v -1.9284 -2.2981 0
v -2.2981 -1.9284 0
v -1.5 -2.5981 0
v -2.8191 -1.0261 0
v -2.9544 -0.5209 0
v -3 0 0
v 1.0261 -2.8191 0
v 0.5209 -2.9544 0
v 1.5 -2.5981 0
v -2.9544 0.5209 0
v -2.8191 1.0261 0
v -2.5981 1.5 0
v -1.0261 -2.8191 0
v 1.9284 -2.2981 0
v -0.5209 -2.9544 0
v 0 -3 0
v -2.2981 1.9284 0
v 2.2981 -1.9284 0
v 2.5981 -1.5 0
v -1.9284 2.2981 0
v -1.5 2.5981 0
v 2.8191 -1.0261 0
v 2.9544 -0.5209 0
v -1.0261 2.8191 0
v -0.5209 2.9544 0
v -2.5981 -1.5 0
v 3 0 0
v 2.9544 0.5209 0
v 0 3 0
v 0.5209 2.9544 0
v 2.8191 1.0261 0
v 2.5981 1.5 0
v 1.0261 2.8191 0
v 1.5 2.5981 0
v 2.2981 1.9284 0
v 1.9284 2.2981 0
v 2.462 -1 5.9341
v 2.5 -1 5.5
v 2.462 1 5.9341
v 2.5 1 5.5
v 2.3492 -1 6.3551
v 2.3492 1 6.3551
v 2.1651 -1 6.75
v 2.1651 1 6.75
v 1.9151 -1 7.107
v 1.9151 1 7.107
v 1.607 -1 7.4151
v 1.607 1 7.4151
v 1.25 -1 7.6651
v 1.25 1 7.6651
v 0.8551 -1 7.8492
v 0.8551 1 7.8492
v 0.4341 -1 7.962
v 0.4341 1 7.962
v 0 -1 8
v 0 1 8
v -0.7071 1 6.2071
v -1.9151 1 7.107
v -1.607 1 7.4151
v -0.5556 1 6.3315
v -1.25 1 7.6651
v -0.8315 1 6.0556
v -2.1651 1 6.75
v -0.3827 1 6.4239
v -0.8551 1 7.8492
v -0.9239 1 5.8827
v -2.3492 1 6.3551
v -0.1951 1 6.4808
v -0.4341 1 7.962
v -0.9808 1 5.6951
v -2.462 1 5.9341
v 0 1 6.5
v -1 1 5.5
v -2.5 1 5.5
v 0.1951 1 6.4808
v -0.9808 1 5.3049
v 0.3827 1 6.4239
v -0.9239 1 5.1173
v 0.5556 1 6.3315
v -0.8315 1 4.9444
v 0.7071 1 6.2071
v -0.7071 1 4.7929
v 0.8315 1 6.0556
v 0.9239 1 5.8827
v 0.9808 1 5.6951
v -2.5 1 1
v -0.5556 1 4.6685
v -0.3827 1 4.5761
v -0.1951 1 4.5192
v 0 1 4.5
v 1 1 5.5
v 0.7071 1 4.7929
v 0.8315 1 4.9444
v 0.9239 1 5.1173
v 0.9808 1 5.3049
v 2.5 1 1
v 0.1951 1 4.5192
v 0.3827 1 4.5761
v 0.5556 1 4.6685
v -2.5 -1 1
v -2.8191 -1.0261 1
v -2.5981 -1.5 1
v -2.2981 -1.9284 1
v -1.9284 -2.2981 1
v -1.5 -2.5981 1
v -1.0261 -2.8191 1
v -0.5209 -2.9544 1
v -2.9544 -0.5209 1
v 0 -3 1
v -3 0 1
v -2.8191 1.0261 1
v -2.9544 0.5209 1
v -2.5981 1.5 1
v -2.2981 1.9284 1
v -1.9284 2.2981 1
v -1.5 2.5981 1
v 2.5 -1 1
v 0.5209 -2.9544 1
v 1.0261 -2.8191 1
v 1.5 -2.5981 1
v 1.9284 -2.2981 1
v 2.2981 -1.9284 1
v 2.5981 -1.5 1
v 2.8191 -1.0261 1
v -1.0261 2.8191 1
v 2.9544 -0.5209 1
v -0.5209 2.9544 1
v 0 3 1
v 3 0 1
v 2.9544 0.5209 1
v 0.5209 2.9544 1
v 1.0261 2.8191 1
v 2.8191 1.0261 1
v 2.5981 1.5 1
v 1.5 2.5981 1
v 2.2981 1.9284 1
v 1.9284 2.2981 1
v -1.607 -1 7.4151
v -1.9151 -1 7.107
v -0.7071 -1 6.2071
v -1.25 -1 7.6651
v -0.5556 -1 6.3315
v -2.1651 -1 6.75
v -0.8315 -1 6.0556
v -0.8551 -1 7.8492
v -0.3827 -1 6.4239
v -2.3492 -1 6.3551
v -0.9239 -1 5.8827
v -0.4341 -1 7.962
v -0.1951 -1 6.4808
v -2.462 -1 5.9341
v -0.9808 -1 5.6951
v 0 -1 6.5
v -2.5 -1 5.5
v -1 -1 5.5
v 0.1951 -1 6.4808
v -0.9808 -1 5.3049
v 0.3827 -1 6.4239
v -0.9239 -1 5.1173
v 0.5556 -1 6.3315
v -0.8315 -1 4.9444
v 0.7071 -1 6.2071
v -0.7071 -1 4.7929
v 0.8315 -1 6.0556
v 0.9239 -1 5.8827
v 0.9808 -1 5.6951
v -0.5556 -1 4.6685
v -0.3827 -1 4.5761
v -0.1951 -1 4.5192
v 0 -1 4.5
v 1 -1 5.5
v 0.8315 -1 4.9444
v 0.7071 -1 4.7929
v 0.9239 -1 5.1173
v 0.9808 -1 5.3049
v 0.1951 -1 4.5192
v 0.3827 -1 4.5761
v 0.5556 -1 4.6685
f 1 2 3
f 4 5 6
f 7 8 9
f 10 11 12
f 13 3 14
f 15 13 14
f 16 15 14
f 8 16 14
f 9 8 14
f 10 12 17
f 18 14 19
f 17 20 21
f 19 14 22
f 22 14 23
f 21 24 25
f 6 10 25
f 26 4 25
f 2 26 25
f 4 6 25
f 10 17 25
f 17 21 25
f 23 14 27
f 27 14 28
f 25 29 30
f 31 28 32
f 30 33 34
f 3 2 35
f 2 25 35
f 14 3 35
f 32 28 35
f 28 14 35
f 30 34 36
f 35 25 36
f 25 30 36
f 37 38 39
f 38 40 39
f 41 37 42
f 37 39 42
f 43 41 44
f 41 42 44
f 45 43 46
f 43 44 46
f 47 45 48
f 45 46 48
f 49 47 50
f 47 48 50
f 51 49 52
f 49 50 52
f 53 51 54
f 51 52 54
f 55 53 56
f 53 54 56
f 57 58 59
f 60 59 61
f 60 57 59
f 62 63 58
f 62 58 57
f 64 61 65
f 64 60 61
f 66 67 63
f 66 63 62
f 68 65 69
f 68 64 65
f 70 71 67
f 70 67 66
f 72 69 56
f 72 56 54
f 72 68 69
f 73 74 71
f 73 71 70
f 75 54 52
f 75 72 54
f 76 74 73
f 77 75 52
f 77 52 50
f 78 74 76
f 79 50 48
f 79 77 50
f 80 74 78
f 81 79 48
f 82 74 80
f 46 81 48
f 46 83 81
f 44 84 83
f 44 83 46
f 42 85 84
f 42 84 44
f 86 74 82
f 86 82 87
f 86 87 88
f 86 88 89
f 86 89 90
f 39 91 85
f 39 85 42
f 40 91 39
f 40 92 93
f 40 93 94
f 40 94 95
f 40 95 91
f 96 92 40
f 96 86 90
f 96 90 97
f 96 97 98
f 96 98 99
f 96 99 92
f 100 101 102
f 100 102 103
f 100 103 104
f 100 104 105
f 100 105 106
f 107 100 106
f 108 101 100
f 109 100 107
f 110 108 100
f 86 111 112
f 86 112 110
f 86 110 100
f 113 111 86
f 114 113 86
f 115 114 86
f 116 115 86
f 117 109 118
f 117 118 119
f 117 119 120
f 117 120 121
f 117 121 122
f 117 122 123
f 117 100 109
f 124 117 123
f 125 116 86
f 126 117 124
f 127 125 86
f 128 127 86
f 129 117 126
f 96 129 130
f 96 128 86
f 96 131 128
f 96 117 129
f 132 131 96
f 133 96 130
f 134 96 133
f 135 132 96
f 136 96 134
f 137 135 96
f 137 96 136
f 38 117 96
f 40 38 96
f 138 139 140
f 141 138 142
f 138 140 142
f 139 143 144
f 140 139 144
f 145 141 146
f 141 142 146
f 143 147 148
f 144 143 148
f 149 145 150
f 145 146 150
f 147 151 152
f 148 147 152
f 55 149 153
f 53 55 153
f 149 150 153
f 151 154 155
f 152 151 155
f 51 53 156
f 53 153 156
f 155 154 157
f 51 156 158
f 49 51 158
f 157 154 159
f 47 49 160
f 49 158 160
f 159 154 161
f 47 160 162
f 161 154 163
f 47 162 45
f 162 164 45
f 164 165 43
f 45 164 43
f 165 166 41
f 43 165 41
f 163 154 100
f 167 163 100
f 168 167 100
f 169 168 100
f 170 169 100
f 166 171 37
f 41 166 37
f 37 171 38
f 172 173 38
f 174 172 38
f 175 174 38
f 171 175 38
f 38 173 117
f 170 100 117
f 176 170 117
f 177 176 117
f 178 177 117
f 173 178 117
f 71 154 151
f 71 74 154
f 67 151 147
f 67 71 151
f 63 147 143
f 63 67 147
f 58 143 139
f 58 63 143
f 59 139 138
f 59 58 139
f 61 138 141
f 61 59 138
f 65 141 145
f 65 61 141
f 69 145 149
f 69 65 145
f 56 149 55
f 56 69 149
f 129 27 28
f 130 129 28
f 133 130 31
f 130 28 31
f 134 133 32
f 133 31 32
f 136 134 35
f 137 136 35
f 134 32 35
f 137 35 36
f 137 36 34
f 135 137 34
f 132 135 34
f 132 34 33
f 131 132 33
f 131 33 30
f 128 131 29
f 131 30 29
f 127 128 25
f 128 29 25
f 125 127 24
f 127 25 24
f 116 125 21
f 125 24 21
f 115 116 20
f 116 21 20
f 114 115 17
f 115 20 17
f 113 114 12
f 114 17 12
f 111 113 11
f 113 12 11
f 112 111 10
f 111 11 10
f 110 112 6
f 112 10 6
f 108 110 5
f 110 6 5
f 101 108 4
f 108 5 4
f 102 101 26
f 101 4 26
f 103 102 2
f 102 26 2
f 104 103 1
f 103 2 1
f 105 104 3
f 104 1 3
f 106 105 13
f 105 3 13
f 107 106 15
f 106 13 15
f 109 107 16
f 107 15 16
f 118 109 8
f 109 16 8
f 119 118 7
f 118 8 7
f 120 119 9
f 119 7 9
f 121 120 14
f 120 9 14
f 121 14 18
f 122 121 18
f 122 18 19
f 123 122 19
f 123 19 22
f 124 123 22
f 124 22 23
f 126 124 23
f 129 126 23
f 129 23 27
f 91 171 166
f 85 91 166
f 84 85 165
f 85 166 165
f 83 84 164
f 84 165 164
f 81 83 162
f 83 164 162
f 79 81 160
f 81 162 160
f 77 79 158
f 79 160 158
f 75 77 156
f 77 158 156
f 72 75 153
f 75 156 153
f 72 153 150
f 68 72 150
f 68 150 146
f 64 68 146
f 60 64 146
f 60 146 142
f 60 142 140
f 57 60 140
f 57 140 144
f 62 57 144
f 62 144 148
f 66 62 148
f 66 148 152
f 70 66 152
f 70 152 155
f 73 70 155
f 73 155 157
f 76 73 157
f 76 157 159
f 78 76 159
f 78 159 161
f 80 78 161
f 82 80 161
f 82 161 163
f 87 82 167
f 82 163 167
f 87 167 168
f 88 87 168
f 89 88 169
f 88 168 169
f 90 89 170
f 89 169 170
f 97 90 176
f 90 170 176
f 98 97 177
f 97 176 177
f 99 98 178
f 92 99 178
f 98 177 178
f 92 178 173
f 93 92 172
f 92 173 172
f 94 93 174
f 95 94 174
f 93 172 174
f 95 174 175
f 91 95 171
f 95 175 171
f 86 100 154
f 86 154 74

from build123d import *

# Parameters (mm, degrees)
F0_R     = 3
F1_DEPTH = 1
F2_W     = 5
F2_H     = 2
F3_DEPTH = 7
F4_R     = 2.49999
F5_R     = 1
F6_DEPTH = 4


# Not quite as in the source:
# - a fillet or chamfer is up to 0.001 mm smaller than in the source, because OpenCascade refuses the exact size


with BuildPart() as f1:
    # F0 (on Top) → F1 (new body)
    with BuildSketch(Plane.XY):
        Circle(F0_R)
    extrude(amount=F1_DEPTH)

    # F2 (on face) → F3 (join)
    with BuildSketch(Plane.XY.offset(1)):
        Rectangle(F2_W, F2_H)
    extrude(amount=F3_DEPTH)

    # F4 (radius 2.5 in the source; OpenCascade refuses exactly that, so slightly less here)
    f4_edges = [f1.edges().sort_by_distance(p)[0] for p in [
        (-2.5, 0, 8),
        (2.5, 0, 8),
    ]]
    fillet(f4_edges, radius=F4_R)

    # F5 (on face) → F6 (cut)
    with BuildSketch(Plane.XZ.offset(1)):
        with Locations((0, 5.5)):
            Circle(F5_R)
    extrude(amount=-F6_DEPTH, mode=Mode.SUBTRACT)


solid = f1.part
